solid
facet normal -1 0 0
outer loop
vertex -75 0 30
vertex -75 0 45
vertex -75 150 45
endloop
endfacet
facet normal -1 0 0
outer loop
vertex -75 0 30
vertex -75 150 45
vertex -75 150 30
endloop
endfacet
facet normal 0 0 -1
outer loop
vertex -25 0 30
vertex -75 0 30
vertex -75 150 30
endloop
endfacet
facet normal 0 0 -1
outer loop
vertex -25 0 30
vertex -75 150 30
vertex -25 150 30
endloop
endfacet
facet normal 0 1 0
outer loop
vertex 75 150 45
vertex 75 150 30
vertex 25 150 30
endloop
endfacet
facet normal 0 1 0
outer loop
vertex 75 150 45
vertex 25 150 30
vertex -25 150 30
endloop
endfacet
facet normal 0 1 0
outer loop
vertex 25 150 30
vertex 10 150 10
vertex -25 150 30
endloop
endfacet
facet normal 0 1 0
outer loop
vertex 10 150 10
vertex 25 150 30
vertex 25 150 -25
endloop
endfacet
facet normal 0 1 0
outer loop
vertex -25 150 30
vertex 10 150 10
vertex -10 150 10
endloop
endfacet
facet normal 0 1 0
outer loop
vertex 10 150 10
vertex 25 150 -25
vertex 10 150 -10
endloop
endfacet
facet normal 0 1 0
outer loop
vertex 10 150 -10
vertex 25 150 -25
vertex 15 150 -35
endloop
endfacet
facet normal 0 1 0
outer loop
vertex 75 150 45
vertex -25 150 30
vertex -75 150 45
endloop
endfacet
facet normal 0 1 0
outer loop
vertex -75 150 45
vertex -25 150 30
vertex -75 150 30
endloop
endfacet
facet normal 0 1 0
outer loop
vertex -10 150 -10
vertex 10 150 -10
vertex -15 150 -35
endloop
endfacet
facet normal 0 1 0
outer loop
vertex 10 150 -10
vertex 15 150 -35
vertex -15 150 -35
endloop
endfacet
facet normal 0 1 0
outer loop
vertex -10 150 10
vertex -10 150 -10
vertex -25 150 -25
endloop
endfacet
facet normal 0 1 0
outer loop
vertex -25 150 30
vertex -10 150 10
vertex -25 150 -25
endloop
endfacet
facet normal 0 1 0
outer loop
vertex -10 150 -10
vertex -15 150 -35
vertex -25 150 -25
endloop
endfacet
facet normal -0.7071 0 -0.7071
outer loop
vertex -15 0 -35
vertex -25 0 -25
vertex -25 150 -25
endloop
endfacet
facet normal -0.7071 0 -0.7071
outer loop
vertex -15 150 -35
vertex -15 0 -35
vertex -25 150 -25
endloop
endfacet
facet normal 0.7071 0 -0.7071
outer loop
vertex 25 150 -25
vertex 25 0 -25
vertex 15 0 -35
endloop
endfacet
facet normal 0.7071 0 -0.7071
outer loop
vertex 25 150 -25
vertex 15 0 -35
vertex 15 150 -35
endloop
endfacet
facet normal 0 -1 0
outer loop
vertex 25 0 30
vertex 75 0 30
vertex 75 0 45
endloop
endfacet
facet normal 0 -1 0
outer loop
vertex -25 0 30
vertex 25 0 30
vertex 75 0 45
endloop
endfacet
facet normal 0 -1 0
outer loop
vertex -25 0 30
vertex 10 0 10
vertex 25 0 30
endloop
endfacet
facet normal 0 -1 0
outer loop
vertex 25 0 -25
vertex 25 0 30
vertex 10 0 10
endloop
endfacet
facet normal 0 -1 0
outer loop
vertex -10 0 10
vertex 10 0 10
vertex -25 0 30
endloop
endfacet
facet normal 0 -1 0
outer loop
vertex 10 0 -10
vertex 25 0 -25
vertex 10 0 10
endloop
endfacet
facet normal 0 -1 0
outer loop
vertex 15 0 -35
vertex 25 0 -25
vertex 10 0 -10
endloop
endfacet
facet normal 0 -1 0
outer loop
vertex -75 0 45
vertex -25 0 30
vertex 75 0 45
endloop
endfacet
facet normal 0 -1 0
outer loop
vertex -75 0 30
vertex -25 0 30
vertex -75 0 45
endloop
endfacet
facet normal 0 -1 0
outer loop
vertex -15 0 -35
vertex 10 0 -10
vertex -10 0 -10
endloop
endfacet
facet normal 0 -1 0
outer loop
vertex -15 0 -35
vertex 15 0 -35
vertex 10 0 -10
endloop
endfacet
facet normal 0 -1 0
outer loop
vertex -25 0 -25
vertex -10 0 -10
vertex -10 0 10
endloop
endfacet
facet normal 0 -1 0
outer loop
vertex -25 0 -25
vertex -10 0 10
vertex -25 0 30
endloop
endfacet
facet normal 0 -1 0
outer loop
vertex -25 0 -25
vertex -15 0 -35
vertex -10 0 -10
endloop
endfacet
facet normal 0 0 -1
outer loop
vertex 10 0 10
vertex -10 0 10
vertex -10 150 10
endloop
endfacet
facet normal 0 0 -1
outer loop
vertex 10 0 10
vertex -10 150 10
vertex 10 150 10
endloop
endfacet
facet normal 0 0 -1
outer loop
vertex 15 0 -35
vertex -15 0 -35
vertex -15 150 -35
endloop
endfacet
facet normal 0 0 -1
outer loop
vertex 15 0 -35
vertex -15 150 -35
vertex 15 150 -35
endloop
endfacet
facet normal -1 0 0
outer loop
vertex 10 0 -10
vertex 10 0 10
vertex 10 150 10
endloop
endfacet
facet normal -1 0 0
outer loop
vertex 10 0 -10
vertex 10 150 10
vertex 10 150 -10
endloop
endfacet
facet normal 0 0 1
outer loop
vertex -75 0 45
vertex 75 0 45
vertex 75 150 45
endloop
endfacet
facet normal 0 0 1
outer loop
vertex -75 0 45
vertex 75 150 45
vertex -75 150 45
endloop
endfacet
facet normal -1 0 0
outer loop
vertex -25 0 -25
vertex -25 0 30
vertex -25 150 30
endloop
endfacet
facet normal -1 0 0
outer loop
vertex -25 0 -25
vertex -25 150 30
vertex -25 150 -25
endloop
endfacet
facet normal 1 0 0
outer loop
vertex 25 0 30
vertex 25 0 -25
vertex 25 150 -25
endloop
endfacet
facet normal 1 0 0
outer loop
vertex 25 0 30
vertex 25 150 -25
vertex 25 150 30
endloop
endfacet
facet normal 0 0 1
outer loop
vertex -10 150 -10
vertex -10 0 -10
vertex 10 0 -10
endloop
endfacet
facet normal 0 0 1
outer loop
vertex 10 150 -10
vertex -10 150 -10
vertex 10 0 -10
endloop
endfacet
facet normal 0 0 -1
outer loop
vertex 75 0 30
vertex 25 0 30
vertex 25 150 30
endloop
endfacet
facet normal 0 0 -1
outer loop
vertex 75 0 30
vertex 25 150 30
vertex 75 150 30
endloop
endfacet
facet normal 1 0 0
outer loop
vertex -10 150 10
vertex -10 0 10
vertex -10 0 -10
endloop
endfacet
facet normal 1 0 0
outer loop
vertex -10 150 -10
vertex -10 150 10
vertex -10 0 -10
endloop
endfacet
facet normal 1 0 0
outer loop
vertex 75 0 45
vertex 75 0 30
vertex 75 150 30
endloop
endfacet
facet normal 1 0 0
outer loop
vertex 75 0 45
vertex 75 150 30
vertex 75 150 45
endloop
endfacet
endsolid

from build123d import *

# Parameters (mm, degrees)
SKETCH1_W           = 20
SKETCH1_H           = 20
BOSS_EXTRUDE1_DEPTH = 150
CHAMFER1_SIZE       = 10


with BuildPart() as part:
    # Sketch1 → Boss-Extrude1 (new body)
    with BuildSketch(Plane(origin=(0, 0, 0), x_dir=(1, 0, 0), z_dir=(0, 1, 0))):
        Polygon((-25, 35), (25, 35), (25, -30), (75, -30), (75, -45), (-75, -45), (-75, -30), (-25, -30), align=None)
        Rectangle(SKETCH1_W, SKETCH1_H, mode=Mode.SUBTRACT)
    extrude(amount=BOSS_EXTRUDE1_DEPTH)

    # Chamfer1
    chamfer1_edges = [part.edges().sort_by_distance(p)[0] for p in [
        (-25, 75, -35),
        (25, 75, -35),
    ]]
    chamfer(chamfer1_edges, length=CHAMFER1_SIZE)


solid = part.part
